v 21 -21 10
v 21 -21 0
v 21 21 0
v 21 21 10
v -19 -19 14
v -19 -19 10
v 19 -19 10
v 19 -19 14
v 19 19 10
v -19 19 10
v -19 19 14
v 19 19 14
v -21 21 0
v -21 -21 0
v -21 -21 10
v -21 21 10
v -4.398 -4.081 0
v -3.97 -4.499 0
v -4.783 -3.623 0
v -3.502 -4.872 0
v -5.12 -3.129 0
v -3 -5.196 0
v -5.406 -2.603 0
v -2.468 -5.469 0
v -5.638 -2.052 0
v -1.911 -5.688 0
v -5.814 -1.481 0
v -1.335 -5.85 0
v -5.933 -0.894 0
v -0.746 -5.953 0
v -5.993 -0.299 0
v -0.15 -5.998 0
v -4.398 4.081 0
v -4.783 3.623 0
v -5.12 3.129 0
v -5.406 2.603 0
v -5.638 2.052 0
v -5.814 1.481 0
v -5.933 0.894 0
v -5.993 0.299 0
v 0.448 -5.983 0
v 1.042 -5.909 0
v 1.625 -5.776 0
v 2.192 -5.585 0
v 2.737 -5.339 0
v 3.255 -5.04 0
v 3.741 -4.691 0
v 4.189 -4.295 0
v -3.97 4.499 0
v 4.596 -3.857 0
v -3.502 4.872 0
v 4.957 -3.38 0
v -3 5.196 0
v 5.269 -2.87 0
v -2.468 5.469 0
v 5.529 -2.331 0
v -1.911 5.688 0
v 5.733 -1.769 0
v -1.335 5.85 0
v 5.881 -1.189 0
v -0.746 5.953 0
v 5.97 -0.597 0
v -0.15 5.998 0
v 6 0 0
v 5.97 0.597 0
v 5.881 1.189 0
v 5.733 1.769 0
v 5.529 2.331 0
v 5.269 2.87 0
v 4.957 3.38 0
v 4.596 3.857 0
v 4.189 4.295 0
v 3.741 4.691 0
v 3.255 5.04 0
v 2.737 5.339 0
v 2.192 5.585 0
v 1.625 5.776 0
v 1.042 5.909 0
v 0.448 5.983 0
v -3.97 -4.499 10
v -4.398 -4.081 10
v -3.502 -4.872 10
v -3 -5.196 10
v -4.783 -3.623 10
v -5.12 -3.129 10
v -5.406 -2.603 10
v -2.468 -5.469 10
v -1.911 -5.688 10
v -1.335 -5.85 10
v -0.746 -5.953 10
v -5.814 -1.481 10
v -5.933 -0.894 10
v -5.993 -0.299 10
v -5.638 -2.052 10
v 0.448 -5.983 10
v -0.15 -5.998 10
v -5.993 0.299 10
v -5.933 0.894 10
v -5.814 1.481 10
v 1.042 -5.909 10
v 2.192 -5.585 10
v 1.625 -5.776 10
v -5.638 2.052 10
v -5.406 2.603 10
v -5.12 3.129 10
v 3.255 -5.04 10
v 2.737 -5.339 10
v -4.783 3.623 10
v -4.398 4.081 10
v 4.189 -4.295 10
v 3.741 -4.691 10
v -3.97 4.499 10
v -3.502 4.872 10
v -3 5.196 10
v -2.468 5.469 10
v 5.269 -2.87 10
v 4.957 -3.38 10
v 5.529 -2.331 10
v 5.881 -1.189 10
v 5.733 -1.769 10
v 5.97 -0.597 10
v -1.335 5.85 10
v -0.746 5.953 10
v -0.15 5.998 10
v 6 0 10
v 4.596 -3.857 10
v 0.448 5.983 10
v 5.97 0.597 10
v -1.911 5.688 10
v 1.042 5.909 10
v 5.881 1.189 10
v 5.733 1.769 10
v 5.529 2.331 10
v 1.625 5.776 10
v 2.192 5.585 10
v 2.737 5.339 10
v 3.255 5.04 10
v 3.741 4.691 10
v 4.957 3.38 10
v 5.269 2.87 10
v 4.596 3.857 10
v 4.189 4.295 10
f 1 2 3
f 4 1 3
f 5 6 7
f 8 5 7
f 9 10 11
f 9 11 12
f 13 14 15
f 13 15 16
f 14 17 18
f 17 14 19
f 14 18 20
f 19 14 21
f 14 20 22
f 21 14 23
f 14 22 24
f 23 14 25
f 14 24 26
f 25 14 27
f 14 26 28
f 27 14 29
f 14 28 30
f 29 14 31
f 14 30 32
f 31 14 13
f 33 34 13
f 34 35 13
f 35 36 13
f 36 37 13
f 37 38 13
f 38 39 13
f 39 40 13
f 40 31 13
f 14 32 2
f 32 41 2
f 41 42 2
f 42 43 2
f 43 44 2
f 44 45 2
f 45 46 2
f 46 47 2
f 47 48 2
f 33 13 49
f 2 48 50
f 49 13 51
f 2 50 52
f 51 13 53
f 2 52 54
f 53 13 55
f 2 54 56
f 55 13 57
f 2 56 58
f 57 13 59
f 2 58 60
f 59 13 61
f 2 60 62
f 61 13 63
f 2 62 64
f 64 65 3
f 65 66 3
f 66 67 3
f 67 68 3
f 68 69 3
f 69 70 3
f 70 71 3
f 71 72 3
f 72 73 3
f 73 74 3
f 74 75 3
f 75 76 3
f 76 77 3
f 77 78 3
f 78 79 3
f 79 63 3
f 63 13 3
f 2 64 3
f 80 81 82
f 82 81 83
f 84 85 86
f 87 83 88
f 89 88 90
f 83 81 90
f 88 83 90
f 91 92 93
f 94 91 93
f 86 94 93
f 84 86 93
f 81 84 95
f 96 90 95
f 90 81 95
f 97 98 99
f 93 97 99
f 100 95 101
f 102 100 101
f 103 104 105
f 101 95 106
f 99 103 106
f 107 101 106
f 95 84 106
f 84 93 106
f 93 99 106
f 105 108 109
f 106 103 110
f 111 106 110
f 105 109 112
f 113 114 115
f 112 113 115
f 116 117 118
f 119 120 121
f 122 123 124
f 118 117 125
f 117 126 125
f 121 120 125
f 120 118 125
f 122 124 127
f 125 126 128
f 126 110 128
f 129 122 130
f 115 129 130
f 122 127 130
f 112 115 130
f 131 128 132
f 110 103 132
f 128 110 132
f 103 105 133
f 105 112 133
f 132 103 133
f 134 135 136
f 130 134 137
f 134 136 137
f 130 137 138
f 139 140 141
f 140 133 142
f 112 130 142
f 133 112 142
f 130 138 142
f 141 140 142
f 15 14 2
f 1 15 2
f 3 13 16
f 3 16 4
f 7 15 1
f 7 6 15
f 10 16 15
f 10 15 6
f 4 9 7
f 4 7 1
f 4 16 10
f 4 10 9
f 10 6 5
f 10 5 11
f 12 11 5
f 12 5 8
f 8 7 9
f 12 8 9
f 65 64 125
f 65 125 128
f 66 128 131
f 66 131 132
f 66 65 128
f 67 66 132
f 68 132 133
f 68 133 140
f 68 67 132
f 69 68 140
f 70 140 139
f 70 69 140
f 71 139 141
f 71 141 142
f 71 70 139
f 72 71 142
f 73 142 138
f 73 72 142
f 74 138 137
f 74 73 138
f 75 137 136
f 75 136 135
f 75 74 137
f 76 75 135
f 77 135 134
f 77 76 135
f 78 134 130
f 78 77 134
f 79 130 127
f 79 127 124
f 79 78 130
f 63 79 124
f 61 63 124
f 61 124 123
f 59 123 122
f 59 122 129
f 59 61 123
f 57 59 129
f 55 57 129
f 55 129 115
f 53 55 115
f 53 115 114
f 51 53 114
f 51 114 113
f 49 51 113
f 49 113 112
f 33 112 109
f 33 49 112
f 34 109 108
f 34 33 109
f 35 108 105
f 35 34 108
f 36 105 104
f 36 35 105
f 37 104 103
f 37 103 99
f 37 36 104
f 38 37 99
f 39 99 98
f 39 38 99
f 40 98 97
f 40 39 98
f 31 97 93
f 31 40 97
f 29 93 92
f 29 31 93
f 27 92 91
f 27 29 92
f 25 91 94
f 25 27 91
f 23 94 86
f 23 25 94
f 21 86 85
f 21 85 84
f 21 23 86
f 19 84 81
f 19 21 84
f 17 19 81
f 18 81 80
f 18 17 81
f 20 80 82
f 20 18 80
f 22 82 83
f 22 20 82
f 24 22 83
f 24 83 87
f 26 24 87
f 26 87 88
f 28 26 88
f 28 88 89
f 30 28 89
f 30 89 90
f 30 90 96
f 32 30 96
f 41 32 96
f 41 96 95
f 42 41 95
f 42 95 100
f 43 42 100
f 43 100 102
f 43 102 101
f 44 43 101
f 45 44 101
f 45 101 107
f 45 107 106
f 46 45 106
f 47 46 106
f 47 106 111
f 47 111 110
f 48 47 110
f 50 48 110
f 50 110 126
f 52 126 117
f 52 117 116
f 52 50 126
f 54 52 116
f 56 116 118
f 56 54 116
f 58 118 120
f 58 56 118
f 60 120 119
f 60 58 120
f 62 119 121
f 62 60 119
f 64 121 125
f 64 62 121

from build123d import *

# Parameters (mm, degrees)
SKETCH_W     = 42
SKETCH_H     = 42
SKETCH_R     = 6
PAD_DEPTH    = 10
SKETCH001_W  = 38
SKETCH001_H  = 38
PAD001_DEPTH = 4


with BuildPart() as part:
    # Sketch → Pad (new body)
    with BuildSketch(Plane.XY):
        Rectangle(SKETCH_W, SKETCH_H)
        Circle(SKETCH_R, mode=Mode.SUBTRACT)
    extrude(amount=PAD_DEPTH)

    # Sketch001 (on Face7 of Pad) → Pad001 (join)
    with BuildSketch(Plane.XY.offset(10)):
        Rectangle(SKETCH001_W, SKETCH001_H)
    extrude(amount=PAD001_DEPTH)


solid = part.part
